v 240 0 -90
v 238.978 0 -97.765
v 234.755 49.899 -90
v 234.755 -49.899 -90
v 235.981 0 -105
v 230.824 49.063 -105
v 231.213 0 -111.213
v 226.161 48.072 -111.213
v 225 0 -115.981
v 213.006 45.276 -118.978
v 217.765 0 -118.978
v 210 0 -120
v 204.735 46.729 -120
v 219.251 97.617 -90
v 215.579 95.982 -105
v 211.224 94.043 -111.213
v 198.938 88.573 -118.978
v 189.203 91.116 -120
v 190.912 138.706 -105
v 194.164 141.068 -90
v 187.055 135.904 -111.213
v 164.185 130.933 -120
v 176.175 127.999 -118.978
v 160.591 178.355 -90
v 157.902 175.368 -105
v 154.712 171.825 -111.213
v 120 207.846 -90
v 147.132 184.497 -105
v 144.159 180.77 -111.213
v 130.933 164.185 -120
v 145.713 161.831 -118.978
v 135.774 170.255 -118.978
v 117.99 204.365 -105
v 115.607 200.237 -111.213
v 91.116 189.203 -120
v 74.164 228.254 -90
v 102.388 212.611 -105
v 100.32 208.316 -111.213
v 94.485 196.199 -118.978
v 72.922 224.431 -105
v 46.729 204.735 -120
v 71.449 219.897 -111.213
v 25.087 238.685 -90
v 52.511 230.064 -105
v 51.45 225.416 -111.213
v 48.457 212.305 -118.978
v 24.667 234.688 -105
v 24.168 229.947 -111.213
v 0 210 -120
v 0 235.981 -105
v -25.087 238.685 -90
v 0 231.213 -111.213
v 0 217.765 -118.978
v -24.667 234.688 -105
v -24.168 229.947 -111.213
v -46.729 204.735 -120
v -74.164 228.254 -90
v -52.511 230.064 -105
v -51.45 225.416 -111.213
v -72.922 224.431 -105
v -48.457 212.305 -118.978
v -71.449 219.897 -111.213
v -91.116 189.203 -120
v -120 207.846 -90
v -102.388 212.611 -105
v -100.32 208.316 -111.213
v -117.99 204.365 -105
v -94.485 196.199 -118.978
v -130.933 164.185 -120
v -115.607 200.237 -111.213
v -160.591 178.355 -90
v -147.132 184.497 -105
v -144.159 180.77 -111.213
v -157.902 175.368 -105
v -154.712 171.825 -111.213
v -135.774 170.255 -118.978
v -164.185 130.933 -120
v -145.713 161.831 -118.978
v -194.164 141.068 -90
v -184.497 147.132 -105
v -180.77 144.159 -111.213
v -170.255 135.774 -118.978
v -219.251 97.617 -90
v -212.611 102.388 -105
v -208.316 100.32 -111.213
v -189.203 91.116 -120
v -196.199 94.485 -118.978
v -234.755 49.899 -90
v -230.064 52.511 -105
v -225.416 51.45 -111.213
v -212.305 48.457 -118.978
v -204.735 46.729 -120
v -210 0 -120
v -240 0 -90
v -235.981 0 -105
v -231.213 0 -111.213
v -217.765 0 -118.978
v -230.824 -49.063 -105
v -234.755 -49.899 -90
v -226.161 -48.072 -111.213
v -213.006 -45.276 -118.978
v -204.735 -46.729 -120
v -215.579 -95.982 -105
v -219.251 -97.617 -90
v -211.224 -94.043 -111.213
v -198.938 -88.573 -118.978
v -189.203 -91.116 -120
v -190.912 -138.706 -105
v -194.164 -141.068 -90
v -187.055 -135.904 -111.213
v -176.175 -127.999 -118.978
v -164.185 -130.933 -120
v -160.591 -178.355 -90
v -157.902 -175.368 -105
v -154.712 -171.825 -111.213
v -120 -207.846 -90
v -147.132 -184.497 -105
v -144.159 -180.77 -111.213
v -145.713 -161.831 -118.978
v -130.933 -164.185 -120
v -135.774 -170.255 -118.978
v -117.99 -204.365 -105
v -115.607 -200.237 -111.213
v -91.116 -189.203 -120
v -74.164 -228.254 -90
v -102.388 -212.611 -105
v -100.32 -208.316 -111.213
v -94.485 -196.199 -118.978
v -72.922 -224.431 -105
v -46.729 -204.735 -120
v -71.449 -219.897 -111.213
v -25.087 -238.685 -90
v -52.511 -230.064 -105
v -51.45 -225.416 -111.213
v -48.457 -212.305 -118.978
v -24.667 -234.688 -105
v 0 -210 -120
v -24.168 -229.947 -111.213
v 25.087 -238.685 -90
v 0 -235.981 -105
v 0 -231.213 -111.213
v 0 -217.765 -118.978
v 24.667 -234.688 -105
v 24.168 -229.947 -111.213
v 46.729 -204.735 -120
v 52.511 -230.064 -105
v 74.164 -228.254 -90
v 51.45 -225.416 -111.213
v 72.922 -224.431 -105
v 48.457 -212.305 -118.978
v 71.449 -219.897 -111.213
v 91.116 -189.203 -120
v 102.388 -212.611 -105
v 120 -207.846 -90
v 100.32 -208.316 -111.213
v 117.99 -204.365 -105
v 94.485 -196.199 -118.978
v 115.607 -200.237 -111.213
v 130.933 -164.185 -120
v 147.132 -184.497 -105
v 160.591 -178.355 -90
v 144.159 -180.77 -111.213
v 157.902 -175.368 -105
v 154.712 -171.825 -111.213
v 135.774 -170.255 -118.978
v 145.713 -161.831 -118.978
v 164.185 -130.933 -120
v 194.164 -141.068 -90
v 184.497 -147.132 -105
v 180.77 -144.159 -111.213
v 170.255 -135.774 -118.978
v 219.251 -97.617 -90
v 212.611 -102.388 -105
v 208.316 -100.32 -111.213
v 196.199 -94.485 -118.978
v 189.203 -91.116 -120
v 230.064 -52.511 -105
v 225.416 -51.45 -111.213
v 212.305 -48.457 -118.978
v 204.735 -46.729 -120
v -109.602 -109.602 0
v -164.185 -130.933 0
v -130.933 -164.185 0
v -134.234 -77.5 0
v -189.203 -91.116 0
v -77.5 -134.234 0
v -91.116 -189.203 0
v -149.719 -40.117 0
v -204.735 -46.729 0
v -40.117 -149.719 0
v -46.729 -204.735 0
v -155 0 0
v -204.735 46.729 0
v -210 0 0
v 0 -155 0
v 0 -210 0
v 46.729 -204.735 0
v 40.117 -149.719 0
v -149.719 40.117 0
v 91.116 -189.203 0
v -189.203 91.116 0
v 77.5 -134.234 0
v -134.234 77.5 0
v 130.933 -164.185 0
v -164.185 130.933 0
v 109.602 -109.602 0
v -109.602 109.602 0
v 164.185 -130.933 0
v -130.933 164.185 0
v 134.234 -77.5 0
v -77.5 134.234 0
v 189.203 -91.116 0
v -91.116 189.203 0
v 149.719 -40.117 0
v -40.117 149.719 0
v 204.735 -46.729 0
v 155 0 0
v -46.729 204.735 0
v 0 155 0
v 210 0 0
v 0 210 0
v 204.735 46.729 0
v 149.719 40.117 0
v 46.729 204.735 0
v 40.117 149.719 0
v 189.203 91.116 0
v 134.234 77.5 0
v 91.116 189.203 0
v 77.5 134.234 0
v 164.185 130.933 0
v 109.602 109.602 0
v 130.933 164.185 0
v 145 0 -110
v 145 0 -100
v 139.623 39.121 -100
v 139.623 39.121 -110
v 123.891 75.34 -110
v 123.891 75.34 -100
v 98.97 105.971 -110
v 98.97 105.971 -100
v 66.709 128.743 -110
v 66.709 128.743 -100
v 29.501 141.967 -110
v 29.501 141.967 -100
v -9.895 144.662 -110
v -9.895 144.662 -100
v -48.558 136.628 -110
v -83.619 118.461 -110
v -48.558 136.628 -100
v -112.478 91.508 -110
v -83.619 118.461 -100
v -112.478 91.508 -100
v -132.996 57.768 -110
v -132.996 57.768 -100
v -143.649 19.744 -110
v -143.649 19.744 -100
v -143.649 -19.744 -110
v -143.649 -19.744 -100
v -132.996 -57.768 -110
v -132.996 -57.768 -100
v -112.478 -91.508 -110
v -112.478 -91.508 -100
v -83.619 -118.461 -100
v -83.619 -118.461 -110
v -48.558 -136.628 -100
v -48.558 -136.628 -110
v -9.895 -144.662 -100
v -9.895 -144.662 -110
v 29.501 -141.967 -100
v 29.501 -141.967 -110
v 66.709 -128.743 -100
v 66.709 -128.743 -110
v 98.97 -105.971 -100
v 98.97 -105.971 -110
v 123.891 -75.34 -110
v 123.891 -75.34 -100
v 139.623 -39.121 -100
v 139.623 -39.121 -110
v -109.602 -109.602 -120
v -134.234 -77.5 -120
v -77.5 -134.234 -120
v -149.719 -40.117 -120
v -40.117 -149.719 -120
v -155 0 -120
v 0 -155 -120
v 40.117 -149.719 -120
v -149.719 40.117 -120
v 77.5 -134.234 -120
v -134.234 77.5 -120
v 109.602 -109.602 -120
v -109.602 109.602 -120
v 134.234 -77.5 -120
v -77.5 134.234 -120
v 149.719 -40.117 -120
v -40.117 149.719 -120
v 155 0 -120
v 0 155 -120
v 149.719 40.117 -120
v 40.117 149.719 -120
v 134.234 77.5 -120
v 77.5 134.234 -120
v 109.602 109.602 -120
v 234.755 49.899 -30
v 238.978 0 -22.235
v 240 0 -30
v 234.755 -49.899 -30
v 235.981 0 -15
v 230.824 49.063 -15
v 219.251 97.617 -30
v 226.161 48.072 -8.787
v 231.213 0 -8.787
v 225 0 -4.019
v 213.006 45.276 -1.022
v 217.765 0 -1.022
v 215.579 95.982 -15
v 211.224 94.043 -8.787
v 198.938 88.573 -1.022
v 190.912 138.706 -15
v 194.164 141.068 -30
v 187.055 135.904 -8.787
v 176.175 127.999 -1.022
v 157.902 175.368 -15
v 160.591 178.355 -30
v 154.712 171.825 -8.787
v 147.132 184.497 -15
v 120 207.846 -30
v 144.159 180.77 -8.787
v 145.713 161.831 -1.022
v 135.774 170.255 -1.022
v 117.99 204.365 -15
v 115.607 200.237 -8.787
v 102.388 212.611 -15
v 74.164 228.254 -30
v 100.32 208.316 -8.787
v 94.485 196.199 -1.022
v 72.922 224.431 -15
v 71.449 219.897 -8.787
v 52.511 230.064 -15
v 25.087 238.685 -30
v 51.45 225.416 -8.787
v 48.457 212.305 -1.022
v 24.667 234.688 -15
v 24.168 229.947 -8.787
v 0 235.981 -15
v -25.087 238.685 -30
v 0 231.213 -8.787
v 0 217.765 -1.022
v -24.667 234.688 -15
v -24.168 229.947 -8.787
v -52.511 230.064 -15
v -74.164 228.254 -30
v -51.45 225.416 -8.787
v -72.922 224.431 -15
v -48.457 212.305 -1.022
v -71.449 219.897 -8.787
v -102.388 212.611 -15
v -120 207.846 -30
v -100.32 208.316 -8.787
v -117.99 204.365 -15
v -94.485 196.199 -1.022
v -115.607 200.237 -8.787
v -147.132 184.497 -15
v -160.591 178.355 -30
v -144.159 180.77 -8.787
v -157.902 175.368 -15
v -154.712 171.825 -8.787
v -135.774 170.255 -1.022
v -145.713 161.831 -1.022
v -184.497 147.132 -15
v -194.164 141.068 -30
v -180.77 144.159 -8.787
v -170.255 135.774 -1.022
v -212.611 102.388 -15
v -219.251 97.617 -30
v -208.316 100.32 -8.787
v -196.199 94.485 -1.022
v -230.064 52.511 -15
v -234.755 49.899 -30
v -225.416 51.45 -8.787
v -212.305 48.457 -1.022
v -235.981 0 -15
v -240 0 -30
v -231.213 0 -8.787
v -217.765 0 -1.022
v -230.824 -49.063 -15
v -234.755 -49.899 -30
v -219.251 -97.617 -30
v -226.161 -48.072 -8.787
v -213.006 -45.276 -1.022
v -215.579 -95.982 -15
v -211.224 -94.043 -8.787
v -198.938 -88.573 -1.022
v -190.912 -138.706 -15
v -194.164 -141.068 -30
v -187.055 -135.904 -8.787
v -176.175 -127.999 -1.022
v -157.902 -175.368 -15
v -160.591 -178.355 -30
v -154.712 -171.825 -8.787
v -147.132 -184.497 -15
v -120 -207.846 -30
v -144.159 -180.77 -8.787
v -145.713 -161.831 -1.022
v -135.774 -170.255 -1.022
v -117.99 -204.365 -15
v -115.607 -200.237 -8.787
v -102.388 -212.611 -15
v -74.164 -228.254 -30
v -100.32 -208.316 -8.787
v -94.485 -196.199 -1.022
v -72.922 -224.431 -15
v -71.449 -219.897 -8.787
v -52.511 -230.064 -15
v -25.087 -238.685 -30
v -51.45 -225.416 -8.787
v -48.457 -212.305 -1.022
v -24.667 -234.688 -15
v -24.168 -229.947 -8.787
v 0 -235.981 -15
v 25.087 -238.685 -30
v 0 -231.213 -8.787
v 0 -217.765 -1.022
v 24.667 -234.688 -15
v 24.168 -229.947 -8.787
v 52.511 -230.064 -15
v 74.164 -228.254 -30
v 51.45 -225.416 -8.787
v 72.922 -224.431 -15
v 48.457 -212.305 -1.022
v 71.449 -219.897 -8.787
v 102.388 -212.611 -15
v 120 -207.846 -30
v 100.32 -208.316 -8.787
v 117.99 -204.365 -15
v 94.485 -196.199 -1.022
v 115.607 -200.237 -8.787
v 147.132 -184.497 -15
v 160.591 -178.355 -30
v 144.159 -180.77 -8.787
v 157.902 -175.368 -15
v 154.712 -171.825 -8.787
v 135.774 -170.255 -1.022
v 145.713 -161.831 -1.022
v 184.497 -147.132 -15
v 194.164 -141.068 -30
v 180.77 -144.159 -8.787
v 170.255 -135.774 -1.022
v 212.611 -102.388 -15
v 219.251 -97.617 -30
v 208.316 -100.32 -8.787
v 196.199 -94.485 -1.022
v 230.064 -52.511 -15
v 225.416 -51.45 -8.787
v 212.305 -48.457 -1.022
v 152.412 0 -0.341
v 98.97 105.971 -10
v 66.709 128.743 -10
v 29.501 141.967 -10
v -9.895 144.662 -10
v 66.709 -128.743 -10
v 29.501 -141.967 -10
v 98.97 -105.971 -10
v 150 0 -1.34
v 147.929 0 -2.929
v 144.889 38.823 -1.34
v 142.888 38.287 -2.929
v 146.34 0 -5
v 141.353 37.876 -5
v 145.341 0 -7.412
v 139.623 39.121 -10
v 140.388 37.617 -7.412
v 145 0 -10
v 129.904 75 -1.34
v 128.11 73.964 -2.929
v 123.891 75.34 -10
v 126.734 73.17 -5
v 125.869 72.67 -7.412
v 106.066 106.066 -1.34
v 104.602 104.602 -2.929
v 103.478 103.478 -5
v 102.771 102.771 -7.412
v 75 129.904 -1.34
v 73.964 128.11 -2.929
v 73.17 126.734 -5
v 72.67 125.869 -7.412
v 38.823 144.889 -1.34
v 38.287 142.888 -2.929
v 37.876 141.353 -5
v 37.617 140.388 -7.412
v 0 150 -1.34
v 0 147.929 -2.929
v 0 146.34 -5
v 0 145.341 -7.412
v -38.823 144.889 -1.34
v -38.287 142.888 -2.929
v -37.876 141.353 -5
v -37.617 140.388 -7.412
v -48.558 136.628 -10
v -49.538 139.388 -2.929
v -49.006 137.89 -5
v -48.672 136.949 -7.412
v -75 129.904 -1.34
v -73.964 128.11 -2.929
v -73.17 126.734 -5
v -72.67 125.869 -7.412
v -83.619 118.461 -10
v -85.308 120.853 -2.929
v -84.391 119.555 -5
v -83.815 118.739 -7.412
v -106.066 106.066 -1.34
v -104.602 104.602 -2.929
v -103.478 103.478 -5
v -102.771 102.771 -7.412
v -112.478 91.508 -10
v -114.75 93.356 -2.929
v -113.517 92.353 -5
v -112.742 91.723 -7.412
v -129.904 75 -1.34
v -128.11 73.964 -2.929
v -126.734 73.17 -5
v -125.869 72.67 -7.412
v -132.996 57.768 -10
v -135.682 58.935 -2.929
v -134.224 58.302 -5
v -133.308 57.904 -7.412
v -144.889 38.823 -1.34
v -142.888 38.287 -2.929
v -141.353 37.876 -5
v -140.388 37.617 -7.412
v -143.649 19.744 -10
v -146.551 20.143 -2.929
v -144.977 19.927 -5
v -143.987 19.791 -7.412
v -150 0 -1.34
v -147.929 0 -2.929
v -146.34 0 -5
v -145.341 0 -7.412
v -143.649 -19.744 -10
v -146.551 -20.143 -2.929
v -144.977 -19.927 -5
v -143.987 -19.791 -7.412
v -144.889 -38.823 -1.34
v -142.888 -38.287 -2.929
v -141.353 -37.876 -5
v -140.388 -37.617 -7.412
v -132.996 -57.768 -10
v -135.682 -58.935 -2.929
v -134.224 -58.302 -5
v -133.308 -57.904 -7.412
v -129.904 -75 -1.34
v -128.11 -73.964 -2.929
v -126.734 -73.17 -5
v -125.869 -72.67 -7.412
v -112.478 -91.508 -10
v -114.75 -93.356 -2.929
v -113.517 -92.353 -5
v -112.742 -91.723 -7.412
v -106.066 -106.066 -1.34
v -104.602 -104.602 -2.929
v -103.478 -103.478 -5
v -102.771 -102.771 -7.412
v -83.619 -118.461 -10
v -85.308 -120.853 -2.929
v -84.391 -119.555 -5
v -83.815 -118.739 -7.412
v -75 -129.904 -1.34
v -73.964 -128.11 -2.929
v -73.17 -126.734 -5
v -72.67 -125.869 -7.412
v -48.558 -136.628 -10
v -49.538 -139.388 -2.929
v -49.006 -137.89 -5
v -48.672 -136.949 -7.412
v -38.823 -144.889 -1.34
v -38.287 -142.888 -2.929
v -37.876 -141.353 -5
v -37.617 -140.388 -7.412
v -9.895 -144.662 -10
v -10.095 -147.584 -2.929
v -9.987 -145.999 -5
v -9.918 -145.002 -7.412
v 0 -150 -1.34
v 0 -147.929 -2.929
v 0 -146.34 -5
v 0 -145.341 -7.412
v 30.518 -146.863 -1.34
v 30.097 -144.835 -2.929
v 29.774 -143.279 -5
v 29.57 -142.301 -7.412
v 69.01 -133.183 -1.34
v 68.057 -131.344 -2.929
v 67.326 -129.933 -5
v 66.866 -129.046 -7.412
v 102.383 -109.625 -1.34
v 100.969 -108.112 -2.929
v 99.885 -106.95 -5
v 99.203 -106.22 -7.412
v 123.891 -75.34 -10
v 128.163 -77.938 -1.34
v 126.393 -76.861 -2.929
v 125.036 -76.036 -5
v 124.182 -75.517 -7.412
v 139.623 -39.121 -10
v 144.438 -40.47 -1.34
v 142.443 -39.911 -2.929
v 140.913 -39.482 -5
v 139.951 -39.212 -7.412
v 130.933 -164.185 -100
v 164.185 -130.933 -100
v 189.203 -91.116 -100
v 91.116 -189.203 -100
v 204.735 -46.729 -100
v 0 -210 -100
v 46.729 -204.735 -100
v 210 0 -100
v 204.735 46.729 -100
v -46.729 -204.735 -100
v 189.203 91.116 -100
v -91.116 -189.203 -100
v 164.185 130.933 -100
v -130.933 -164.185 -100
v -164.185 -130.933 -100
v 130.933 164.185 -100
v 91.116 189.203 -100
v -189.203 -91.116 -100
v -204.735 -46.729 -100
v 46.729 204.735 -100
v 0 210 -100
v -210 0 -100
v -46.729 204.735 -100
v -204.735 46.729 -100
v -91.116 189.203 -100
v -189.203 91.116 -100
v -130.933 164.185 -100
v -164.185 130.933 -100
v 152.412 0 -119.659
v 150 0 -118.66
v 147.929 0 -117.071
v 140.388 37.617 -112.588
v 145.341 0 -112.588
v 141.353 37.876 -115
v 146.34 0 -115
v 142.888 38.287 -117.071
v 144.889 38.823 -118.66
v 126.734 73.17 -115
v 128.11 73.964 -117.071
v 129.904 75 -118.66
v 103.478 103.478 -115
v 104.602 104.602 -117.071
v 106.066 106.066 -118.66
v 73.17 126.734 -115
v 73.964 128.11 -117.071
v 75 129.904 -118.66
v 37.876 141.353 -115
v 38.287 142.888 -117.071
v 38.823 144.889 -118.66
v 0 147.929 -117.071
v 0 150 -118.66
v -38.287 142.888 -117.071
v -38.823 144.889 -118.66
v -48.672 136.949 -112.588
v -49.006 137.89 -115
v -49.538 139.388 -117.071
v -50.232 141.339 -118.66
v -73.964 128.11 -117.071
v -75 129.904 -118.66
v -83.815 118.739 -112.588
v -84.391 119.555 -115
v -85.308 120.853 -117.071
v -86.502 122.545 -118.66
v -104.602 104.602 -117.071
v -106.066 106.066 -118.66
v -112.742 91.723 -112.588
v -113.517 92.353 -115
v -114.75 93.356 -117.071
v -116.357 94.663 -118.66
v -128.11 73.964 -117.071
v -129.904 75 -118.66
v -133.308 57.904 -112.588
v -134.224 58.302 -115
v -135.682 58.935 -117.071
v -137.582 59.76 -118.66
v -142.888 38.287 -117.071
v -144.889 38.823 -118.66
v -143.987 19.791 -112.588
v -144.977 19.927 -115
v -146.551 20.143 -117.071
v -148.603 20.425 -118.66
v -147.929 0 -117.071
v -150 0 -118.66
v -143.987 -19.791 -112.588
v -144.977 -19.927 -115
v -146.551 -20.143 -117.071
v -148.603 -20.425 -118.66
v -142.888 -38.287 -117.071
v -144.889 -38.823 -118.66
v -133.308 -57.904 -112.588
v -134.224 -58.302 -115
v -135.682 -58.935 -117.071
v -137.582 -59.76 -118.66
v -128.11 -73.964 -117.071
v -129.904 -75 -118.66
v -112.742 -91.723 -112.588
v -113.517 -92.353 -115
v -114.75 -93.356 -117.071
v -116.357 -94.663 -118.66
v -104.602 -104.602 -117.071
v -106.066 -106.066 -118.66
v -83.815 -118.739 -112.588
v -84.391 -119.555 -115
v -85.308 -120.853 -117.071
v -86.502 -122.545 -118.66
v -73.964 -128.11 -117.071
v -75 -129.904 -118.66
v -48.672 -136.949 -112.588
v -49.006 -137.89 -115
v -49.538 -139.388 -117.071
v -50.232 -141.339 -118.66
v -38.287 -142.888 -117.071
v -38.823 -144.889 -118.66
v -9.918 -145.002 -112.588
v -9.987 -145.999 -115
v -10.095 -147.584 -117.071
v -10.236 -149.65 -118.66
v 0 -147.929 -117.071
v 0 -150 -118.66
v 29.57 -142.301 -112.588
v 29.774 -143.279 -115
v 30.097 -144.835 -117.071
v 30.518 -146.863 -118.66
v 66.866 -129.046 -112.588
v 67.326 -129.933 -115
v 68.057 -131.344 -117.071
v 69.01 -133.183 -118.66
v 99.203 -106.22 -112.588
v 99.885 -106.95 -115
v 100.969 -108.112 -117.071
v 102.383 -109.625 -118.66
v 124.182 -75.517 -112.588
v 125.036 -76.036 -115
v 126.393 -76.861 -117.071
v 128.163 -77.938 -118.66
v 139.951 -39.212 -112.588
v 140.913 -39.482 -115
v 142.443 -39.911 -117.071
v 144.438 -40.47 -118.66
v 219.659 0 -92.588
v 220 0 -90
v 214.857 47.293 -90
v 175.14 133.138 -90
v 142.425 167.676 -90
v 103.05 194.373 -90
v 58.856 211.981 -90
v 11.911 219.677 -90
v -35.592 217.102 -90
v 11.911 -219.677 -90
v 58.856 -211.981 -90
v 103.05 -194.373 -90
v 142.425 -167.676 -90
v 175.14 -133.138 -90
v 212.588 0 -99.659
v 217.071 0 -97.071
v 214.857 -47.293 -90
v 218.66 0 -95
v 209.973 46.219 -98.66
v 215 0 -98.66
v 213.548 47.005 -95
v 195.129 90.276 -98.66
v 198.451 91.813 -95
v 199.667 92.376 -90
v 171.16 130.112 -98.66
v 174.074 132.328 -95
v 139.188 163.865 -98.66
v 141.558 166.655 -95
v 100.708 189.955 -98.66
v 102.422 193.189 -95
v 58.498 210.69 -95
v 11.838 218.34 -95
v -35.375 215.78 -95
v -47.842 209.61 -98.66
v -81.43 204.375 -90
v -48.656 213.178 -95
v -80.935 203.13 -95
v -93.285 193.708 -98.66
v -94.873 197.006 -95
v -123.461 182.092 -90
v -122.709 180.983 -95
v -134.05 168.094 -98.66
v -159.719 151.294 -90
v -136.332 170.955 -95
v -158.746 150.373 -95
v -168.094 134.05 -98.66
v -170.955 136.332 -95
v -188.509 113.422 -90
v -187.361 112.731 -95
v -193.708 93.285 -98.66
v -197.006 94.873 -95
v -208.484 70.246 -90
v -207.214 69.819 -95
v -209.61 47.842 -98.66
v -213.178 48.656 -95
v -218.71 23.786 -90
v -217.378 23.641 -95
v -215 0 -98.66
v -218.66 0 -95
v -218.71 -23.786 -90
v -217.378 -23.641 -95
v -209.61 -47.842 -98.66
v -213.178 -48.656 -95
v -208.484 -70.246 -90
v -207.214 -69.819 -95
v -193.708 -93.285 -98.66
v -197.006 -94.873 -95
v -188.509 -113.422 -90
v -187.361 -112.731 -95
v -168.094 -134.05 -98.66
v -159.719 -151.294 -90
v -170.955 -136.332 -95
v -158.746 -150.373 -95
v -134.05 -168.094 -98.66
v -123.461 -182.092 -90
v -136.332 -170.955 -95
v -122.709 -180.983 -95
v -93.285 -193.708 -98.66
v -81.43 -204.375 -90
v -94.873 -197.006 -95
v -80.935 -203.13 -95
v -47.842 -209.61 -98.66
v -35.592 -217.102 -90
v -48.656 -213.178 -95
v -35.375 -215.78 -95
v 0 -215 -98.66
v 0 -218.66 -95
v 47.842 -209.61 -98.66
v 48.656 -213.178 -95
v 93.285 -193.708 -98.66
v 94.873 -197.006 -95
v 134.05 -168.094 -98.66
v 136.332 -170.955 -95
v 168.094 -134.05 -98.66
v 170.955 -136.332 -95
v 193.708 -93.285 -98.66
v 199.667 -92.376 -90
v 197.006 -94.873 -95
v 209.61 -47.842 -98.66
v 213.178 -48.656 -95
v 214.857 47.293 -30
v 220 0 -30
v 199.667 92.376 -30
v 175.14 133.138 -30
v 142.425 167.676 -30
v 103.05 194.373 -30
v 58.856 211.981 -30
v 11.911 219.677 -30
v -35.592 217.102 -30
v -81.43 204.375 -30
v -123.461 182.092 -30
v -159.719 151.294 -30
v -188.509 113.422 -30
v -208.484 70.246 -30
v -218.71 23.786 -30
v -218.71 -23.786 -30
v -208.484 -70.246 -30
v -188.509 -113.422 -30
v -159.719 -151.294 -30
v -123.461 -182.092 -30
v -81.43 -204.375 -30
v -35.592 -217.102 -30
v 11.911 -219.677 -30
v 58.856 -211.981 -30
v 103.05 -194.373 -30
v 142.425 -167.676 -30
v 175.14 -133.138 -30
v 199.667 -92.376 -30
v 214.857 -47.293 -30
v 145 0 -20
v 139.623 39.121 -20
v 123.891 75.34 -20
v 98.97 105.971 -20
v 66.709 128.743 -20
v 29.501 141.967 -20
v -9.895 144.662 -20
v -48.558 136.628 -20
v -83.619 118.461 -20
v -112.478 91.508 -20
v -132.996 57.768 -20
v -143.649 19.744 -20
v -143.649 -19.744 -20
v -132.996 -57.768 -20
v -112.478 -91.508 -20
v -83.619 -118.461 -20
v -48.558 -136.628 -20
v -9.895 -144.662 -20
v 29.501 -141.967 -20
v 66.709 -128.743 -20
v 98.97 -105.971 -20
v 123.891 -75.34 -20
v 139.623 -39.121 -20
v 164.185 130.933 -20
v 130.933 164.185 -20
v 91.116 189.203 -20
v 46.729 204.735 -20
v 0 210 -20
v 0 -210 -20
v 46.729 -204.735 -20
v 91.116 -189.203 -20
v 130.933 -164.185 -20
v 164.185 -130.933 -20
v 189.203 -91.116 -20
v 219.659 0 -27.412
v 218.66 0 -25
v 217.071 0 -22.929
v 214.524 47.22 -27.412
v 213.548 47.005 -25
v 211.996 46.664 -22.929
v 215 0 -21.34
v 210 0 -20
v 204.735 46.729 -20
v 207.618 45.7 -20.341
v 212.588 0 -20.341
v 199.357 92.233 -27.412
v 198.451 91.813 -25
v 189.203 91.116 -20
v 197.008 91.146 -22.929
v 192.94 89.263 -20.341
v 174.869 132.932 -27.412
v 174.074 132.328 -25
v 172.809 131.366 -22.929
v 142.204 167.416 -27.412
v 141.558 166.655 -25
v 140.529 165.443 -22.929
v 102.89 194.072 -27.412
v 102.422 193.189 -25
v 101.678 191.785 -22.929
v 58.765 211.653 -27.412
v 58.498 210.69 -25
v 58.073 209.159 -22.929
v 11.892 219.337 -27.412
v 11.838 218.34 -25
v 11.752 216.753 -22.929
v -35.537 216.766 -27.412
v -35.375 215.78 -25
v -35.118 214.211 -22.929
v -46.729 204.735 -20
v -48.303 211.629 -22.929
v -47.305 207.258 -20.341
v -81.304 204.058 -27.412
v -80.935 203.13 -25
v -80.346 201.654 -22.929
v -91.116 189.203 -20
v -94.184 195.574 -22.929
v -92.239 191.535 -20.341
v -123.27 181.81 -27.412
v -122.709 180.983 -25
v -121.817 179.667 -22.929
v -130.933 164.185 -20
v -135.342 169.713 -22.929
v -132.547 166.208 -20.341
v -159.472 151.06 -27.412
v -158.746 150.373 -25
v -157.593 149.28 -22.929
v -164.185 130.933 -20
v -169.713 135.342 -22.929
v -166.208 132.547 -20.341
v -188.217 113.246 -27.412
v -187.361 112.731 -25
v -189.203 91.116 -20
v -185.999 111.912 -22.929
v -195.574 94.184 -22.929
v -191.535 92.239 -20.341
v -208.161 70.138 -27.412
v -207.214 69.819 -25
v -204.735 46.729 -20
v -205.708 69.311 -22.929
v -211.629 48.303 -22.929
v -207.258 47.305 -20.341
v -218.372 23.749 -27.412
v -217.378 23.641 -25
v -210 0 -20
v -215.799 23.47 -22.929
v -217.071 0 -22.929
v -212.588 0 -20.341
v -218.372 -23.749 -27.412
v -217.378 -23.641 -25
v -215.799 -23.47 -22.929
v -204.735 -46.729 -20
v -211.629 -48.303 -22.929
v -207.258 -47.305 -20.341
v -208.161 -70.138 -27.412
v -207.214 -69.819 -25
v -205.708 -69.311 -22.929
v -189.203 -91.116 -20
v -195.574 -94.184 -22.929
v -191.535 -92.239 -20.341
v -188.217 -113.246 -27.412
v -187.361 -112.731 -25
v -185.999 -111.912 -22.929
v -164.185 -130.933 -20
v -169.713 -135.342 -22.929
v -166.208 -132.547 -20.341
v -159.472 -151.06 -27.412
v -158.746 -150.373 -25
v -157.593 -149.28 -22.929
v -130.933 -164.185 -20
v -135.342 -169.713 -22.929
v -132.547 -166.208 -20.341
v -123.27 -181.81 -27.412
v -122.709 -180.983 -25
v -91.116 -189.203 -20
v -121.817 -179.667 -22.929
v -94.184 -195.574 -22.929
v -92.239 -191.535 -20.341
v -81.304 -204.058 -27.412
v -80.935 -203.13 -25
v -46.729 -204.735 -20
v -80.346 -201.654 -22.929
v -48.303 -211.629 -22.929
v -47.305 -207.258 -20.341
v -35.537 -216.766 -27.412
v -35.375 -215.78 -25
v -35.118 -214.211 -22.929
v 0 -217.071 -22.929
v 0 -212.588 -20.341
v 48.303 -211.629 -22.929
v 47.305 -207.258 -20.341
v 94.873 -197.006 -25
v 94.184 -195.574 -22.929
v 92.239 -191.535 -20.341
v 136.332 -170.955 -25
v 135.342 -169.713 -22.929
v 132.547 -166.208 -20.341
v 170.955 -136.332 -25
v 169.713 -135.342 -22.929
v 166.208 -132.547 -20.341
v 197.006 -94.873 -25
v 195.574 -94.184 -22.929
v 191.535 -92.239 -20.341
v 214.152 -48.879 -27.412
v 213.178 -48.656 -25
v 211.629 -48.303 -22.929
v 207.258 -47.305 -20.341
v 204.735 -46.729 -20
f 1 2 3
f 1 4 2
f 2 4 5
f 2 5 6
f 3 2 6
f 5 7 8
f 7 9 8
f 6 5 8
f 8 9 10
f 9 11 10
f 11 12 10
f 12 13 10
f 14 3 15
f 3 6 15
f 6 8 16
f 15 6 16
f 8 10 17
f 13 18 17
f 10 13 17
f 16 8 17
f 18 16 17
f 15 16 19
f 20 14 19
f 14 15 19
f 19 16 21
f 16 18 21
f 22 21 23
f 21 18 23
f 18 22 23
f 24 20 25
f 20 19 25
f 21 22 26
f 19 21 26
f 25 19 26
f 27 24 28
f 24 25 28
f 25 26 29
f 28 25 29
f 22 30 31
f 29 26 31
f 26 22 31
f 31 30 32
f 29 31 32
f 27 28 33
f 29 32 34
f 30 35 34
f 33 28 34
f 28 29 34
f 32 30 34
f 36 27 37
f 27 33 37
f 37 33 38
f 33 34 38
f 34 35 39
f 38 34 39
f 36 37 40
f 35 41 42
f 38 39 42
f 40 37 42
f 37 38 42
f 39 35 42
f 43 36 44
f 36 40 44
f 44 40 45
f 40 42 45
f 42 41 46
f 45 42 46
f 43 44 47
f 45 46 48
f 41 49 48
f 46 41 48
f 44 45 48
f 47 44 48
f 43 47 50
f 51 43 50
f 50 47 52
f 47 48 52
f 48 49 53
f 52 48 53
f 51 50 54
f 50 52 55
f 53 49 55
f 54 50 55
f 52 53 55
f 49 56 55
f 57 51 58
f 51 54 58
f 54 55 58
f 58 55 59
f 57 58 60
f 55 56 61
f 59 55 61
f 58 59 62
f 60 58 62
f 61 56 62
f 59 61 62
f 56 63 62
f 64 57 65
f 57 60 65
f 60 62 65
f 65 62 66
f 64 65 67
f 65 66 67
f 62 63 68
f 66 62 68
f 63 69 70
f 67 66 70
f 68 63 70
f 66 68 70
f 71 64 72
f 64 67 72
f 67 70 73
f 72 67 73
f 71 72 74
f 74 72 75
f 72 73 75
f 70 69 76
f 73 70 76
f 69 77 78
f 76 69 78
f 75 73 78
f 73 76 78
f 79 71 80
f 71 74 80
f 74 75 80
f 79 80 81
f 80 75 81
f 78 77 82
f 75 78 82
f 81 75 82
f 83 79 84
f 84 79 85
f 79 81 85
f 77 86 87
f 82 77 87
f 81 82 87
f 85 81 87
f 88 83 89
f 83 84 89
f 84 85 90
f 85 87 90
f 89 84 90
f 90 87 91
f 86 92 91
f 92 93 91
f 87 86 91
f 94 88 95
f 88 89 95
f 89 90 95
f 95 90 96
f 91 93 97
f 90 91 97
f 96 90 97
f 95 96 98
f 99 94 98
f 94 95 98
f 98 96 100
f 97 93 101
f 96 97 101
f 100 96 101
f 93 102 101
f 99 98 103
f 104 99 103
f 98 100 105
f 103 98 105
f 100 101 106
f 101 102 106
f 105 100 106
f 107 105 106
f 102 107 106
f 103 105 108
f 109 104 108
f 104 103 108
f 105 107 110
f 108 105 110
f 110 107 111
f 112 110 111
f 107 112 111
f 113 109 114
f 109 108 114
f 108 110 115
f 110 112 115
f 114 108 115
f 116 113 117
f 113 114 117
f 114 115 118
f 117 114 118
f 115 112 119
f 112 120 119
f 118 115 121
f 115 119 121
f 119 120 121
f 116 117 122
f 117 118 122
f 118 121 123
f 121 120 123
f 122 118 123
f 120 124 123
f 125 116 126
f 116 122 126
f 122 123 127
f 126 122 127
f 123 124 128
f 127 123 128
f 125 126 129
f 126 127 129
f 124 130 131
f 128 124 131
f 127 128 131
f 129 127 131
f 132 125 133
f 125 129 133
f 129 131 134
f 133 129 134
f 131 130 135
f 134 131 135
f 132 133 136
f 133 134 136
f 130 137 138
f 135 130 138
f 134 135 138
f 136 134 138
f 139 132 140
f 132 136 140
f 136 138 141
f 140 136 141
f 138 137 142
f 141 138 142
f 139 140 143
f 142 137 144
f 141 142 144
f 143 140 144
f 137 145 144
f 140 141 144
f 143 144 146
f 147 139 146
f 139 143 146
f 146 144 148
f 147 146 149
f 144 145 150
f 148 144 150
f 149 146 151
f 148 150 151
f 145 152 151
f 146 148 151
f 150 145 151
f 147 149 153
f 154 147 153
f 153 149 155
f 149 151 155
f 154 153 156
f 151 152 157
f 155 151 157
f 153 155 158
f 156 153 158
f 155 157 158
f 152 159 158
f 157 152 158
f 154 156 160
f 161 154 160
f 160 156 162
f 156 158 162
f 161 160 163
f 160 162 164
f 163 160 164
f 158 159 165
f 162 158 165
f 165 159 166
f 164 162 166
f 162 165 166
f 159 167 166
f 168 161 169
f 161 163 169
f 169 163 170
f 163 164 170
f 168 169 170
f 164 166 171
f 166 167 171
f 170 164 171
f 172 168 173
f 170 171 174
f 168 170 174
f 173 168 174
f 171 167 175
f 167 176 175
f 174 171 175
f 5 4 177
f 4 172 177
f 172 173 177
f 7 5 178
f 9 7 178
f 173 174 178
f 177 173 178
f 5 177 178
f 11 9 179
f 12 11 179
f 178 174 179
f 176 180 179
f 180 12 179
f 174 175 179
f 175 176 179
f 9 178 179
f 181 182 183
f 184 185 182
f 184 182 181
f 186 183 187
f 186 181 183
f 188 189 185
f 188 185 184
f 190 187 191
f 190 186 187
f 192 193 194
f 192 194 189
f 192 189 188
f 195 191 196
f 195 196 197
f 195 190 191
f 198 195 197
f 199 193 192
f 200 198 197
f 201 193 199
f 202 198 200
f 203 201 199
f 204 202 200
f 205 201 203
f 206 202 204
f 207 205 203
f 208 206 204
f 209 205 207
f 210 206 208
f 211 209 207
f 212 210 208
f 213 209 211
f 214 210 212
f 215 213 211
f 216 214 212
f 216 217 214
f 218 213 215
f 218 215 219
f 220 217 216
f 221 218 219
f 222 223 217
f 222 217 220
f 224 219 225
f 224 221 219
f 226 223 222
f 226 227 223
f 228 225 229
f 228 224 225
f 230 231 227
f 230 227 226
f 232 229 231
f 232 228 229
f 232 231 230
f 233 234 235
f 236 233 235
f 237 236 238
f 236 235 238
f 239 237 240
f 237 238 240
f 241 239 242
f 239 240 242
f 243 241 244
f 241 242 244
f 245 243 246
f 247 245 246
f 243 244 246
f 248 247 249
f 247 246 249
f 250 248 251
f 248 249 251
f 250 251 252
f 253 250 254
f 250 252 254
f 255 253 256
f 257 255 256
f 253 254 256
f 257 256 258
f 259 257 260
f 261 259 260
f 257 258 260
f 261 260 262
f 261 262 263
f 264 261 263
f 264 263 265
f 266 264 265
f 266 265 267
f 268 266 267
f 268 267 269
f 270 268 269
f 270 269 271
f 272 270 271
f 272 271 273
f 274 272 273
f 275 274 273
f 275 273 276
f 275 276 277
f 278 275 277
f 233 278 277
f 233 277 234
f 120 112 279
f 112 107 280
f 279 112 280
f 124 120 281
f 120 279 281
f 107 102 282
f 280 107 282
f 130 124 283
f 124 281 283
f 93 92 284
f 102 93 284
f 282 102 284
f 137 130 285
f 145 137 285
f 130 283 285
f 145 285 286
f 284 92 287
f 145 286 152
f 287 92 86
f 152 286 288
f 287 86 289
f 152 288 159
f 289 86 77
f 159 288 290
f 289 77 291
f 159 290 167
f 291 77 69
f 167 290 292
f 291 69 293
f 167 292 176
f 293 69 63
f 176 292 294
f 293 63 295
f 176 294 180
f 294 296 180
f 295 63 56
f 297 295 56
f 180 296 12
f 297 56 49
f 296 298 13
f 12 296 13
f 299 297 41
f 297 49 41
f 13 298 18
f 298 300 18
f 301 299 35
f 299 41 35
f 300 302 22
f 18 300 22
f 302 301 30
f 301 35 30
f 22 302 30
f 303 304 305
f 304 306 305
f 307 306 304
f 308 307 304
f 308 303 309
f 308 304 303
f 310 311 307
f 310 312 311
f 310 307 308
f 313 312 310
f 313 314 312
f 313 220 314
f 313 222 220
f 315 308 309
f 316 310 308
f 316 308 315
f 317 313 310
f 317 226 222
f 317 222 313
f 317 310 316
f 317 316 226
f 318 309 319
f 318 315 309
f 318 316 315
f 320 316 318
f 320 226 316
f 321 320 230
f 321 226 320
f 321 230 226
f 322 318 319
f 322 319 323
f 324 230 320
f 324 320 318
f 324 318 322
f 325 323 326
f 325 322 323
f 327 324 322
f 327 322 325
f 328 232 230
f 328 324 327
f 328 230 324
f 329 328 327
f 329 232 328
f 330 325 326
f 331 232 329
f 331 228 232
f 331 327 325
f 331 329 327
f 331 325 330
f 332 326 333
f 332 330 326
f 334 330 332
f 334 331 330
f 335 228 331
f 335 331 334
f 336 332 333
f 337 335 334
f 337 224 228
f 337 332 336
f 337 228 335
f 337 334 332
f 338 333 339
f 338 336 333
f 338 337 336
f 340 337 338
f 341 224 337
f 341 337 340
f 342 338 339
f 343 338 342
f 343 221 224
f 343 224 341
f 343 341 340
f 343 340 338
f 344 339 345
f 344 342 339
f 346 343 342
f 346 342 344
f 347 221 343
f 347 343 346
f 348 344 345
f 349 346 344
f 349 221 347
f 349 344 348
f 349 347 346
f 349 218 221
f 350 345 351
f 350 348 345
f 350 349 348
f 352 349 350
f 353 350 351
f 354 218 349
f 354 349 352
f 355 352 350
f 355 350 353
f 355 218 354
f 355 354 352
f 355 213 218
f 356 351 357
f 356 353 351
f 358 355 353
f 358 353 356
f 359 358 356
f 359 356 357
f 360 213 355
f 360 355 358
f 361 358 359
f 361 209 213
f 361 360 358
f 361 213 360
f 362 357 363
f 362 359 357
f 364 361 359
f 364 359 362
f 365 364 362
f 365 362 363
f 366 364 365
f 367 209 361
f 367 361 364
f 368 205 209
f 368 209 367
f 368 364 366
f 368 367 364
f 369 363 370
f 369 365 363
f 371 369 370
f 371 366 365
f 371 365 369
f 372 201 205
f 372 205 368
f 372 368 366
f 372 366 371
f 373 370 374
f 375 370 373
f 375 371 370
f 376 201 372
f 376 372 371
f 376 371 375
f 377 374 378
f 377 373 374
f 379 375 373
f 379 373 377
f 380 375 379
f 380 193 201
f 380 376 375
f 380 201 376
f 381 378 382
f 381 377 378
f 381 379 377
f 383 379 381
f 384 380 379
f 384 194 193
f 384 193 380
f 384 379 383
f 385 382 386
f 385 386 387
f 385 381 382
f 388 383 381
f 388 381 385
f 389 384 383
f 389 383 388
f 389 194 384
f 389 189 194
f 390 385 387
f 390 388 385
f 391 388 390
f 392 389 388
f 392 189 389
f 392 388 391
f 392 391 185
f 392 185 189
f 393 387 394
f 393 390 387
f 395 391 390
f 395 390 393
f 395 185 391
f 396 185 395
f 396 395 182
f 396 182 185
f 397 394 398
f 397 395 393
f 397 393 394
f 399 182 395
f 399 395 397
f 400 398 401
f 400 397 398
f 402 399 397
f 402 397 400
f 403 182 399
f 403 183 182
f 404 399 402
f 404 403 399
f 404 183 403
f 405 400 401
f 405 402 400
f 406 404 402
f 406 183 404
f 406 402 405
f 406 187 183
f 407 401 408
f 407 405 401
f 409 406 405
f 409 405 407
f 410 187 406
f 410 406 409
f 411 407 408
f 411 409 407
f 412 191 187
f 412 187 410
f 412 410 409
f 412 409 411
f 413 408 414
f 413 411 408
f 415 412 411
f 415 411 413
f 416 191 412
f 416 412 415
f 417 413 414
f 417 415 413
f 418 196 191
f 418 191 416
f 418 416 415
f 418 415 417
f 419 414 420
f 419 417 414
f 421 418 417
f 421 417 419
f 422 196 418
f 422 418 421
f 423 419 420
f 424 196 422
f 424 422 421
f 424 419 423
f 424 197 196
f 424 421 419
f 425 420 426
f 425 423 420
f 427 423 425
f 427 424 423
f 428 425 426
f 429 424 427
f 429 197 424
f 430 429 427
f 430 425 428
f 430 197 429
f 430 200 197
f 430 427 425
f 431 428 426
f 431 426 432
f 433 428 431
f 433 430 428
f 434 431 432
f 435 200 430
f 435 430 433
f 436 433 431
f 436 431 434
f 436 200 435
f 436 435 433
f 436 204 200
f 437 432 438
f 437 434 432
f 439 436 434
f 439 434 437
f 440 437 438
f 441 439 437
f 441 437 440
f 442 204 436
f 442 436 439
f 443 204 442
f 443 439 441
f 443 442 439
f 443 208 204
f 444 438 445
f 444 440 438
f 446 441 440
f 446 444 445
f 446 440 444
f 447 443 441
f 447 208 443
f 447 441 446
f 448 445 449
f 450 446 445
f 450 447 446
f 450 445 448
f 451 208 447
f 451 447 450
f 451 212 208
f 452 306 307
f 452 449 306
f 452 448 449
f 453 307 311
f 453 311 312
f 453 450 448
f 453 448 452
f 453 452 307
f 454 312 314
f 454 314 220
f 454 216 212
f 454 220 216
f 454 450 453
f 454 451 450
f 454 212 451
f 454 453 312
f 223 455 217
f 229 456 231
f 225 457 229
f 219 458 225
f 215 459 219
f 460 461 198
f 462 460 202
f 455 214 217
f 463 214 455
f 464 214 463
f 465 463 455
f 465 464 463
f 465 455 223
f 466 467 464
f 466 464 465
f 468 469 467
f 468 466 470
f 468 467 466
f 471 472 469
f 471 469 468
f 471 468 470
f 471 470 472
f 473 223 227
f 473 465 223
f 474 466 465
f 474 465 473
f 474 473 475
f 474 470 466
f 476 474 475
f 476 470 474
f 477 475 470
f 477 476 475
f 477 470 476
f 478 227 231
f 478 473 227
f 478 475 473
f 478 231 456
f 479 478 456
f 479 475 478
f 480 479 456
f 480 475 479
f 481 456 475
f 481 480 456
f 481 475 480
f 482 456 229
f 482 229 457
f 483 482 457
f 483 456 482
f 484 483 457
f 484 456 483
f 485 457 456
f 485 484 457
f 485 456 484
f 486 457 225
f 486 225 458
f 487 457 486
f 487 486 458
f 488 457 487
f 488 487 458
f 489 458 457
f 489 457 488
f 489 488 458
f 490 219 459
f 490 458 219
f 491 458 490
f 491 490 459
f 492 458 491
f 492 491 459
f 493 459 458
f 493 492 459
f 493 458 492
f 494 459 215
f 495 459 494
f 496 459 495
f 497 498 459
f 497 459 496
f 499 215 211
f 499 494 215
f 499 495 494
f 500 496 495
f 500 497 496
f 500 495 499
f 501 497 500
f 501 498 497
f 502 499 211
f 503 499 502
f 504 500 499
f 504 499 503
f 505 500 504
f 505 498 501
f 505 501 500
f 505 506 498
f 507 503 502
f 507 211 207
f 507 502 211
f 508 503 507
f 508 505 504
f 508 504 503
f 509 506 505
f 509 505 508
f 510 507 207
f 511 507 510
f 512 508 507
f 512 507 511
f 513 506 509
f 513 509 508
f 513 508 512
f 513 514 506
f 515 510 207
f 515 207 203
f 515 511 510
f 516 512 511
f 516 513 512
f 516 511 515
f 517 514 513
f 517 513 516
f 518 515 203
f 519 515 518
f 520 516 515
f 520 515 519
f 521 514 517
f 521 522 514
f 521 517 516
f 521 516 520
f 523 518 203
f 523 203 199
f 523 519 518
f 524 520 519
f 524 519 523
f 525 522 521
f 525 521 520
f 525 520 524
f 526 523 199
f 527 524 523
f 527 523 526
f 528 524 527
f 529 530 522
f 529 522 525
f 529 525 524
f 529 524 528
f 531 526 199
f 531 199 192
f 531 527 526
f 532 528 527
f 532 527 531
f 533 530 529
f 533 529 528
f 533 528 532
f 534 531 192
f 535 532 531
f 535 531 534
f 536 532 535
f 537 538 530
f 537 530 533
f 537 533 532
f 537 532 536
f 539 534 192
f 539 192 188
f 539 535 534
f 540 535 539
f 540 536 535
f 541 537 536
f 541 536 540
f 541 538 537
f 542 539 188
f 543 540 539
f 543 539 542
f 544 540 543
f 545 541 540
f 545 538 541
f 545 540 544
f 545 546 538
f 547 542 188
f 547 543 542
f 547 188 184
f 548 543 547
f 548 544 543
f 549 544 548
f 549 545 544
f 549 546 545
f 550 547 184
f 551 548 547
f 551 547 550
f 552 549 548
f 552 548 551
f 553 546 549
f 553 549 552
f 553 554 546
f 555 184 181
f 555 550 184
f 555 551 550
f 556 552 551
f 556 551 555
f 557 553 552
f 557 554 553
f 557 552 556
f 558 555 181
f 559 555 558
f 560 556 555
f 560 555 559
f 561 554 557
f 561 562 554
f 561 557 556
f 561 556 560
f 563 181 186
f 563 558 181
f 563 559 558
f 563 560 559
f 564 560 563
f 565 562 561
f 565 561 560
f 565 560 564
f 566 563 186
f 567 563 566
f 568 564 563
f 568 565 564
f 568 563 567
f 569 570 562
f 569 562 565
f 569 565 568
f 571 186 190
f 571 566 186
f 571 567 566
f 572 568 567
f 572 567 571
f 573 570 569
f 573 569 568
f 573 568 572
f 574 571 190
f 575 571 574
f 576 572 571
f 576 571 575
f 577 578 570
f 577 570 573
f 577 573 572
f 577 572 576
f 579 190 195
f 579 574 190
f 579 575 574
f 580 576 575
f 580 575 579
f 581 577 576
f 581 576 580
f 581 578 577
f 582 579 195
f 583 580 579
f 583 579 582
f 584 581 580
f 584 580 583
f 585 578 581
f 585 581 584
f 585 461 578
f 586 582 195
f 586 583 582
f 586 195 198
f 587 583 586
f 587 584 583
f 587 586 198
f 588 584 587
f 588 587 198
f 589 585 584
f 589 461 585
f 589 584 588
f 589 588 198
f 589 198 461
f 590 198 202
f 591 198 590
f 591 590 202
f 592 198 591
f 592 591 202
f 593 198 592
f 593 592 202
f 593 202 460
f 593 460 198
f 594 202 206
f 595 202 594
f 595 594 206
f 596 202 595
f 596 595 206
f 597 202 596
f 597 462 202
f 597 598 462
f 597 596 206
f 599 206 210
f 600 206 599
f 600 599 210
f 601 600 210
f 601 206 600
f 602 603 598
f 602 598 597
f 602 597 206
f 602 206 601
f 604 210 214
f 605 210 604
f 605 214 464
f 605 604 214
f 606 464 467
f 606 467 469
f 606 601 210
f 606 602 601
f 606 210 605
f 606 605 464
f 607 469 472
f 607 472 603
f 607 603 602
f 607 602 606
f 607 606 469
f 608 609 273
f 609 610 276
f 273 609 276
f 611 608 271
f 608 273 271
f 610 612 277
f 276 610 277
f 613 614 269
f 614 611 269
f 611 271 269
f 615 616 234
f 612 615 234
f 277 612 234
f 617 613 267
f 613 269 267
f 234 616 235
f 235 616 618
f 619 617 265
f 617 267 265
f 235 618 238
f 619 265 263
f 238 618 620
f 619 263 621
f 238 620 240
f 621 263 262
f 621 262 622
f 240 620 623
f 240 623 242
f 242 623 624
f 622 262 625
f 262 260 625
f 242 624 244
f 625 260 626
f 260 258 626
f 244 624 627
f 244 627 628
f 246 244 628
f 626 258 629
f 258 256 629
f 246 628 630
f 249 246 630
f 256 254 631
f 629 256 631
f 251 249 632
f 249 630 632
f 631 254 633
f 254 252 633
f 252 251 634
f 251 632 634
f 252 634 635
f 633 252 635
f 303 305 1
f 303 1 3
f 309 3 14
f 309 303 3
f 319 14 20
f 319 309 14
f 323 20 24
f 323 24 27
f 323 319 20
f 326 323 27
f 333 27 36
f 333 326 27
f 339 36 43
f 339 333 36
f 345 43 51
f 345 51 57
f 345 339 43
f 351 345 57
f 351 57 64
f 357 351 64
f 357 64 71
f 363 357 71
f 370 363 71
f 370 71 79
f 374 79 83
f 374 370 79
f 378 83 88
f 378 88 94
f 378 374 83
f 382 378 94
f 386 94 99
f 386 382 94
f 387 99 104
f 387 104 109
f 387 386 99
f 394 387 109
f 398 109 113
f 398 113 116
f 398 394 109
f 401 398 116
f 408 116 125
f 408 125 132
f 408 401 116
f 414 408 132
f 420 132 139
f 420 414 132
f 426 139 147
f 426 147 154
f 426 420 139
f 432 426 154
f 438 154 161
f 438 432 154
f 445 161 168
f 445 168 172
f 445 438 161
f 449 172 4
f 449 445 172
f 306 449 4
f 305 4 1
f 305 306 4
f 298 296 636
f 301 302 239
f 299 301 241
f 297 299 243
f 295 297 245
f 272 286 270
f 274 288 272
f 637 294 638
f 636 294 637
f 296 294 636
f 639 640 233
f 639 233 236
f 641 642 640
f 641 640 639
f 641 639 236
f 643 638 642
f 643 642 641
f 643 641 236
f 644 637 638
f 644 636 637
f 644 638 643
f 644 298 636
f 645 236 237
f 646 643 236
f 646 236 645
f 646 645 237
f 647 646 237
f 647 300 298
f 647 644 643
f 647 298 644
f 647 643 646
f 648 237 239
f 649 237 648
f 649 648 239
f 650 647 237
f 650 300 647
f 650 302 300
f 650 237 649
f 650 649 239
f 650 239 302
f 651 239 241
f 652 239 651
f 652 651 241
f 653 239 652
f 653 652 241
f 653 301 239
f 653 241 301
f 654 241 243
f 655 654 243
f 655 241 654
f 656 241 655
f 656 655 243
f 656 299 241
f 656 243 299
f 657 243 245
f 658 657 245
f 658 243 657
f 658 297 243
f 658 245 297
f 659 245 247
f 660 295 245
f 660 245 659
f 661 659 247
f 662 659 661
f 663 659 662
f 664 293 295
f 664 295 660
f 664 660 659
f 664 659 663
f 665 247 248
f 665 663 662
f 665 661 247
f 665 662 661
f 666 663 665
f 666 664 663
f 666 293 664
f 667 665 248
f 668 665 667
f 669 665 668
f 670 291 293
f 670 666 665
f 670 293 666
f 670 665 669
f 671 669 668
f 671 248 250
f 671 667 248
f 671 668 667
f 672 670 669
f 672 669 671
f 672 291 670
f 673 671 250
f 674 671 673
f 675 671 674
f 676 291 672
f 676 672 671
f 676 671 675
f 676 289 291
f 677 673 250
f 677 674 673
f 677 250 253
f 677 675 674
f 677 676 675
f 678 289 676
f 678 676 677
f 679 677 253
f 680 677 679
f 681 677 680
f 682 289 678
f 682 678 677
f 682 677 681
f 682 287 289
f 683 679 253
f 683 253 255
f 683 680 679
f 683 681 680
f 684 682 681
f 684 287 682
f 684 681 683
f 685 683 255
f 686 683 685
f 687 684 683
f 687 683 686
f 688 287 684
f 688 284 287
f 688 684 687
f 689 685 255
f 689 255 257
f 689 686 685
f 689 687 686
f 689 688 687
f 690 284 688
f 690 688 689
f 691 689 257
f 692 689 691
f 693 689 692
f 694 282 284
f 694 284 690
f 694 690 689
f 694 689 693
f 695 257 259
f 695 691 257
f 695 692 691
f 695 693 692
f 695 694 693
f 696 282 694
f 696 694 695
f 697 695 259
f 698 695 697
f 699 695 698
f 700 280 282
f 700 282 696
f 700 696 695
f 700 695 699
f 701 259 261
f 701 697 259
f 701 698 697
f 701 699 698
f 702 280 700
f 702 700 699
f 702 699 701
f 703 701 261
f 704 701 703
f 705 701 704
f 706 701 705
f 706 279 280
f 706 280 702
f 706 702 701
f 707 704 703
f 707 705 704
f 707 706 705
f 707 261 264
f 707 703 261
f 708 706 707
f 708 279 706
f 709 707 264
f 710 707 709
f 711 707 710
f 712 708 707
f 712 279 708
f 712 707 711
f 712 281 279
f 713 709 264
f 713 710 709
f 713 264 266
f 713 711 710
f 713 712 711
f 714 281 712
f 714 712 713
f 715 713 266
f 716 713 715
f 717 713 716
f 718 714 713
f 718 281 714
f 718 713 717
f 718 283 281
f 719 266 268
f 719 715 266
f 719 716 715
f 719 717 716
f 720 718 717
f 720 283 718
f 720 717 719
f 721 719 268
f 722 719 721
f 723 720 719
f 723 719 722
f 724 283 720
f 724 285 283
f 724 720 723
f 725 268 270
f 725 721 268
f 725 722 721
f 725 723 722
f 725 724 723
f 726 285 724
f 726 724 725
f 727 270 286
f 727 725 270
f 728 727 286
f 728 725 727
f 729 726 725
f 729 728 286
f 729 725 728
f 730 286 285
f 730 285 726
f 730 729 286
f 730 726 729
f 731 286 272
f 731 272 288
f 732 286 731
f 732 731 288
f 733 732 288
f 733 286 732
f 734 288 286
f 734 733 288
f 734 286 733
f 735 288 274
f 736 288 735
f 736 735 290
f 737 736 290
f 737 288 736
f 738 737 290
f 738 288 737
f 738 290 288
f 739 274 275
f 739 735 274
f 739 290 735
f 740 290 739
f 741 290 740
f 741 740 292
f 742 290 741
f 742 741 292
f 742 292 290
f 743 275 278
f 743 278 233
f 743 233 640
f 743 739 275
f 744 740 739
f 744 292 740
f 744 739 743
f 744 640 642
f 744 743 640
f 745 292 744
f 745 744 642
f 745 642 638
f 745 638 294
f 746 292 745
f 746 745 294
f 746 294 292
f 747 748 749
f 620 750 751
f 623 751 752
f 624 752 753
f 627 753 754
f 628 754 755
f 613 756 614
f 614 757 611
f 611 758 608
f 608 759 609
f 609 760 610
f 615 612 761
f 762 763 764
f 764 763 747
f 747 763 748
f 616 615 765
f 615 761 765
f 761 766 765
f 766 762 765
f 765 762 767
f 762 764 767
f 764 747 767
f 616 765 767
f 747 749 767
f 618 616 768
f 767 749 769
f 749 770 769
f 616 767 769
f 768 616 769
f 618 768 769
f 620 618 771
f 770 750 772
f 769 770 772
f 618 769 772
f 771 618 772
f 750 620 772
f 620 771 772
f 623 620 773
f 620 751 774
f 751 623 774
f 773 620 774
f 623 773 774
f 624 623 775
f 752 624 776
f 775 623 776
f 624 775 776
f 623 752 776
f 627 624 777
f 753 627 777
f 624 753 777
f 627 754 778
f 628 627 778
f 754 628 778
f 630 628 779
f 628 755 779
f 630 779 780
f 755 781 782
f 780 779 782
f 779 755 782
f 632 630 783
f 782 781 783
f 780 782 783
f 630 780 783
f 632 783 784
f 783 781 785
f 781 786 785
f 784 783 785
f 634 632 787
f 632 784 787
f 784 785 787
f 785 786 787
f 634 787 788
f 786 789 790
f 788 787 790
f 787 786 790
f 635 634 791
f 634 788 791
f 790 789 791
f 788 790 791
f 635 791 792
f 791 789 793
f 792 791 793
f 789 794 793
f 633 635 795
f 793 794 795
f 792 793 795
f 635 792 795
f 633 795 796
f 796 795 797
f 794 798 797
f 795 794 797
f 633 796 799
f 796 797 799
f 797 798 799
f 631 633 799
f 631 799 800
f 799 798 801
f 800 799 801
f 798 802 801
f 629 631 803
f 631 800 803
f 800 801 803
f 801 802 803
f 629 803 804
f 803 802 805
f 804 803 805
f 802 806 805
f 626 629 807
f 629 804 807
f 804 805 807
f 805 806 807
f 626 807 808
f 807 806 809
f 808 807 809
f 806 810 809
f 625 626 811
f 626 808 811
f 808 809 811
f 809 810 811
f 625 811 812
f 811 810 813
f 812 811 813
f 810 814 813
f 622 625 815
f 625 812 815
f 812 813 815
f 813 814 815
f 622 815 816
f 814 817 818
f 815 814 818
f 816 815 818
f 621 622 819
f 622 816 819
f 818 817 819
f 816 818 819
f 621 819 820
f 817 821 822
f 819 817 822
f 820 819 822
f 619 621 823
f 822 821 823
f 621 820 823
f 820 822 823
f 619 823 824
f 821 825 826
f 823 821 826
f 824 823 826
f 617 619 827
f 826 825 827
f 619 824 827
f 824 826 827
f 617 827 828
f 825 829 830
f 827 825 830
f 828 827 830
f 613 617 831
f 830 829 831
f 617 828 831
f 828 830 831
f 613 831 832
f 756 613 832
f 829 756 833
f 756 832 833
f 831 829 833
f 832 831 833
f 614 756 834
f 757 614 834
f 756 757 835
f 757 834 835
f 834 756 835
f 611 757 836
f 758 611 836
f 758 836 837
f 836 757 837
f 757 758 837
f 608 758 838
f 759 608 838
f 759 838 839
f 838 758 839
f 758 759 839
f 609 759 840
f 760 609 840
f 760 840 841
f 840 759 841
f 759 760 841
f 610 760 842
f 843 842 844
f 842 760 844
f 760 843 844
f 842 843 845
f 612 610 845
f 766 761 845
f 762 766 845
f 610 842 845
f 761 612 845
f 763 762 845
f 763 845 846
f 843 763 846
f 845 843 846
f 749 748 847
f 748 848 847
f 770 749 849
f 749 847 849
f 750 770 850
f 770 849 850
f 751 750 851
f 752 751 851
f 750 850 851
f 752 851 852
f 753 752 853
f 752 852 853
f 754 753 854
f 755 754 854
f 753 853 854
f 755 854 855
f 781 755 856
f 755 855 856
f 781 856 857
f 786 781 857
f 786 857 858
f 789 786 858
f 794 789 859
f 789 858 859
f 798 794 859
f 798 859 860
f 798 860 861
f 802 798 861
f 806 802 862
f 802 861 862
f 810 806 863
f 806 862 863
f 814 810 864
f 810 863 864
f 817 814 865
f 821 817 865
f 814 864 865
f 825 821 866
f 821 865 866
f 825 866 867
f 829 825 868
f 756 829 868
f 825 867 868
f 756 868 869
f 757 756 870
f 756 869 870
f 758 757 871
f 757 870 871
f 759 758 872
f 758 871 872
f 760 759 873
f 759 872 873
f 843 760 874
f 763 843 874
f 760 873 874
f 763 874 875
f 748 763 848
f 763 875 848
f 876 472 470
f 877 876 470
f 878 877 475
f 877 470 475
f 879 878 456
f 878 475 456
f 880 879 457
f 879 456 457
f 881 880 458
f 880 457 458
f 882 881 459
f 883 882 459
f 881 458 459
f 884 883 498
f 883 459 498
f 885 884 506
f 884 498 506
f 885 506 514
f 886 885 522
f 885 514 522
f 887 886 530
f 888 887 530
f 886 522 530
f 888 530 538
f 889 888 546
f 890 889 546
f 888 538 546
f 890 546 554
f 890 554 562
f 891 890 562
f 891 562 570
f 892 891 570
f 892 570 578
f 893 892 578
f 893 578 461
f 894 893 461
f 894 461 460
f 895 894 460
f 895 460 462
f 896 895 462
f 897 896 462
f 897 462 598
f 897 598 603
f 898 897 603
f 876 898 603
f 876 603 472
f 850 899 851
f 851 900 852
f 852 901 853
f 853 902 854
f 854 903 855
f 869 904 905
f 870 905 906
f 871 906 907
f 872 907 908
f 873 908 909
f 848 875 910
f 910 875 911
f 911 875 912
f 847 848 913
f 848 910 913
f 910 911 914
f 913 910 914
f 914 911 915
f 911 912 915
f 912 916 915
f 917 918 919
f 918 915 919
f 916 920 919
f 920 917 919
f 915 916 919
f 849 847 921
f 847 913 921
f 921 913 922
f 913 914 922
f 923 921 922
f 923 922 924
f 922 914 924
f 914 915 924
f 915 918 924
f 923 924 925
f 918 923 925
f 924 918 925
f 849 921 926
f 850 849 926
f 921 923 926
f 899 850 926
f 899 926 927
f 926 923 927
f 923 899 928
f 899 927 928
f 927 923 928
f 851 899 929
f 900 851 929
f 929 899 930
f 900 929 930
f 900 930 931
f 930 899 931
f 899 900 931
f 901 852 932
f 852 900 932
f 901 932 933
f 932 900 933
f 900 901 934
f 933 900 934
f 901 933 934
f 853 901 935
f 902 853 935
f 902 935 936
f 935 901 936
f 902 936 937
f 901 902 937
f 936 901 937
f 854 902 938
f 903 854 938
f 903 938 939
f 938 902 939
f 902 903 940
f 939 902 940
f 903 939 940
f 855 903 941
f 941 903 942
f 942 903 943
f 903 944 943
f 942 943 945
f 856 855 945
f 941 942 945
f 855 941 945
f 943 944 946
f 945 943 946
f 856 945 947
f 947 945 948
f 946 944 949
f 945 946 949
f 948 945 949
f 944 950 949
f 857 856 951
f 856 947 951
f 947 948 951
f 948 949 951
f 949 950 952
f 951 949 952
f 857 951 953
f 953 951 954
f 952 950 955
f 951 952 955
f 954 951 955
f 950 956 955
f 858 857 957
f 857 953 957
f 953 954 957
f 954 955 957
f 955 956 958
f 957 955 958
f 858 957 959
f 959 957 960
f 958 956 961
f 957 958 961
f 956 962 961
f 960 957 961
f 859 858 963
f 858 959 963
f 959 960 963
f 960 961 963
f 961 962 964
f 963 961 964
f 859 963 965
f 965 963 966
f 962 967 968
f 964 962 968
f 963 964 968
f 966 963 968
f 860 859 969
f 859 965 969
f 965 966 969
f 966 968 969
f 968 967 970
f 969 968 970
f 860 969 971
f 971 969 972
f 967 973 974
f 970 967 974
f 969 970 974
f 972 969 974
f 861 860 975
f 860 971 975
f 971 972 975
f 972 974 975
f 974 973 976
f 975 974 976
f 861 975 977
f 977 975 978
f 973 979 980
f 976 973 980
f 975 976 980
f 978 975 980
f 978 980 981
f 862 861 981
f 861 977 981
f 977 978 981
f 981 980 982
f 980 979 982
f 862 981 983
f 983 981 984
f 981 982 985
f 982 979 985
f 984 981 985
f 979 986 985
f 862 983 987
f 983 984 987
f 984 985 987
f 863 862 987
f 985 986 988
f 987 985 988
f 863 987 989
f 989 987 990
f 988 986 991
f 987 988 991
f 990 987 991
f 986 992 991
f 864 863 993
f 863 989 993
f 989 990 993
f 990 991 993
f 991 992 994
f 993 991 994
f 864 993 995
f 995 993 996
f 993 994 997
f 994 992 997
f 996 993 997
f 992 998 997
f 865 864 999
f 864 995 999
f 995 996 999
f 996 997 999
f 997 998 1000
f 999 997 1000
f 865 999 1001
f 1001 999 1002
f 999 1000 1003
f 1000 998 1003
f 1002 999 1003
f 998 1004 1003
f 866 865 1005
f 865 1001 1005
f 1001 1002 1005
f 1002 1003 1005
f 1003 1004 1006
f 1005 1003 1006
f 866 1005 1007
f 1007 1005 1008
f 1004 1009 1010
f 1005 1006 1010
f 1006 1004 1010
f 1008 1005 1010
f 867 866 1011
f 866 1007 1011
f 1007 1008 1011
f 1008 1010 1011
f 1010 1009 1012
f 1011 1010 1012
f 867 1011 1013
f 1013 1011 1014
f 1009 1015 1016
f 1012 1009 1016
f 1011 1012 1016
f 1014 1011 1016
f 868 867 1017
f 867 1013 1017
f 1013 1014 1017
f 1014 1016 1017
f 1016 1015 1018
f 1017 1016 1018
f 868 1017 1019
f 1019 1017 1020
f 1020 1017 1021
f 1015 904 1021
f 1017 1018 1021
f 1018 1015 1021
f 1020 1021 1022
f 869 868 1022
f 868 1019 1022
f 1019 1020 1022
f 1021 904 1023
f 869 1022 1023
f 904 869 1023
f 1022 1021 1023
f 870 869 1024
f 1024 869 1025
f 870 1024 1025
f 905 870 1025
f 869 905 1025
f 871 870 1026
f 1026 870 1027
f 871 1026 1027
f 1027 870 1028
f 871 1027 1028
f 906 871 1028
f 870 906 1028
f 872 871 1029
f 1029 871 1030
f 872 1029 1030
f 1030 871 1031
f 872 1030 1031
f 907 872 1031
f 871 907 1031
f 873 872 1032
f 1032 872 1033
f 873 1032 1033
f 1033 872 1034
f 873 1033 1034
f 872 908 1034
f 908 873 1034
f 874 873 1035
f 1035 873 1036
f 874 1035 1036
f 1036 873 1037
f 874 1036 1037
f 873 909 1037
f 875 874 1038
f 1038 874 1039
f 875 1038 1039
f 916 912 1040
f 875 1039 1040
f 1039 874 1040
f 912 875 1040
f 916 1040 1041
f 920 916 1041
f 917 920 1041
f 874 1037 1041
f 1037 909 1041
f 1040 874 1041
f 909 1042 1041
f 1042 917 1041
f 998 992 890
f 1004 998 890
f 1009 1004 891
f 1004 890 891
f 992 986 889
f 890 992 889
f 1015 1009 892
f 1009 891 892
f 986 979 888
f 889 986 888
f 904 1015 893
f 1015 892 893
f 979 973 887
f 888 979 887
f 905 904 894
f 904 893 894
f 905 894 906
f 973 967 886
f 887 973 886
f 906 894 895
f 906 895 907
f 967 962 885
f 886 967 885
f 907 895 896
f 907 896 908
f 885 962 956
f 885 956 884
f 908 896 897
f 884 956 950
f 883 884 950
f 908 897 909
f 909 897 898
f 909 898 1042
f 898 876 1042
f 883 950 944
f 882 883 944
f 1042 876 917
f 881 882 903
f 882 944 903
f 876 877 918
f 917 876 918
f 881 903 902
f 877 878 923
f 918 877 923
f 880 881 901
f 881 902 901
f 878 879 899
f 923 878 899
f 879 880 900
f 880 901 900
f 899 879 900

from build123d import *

# Parameters (mm, degrees)
SKETCH1_R           = 240
SKETCH1_R_2         = 145
EXTRUDE_THIN1_DEPTH = 120
FILLET1_R           = 30
FILLET2_R           = 10
FILLET3_R           = 10


# Read off the part's stored shape, not the designer's step: Shell1
with BuildPart() as part:
    # Sketch1 → Extrude-Thin1 (new body)
    with BuildSketch(Plane.XY):
        Circle(SKETCH1_R)
        Circle(SKETCH1_R_2, mode=Mode.SUBTRACT)
    extrude(amount=-EXTRUDE_THIN1_DEPTH)

    # Fillet1
    fillet1_edges = [part.edges().sort_by_distance(p)[0] for p in [
        (-240, 0, 0),
        (-240, 0, -120),
    ]]
    fillet(fillet1_edges, radius=FILLET1_R)

    # Fillet2
    fillet2_edges = [part.edges().sort_by_distance(p)[0] for p in [
        (-145, 0, 0),
    ]]
    fillet(fillet2_edges, radius=FILLET2_R)

    # Fillet3
    fillet3_edges = [part.edges().sort_by_distance(p)[0] for p in [
        (-145, 0, -120),
    ]]
    fillet(fillet3_edges, radius=FILLET3_R)

    # Shell1 outline → Shell1 (revolve, cut)
    with BuildSketch(Plane.XZ):
        with BuildLine():
            ThreePointArc((210, -100), (217.071067812, -97.071067812), (220, -90))
            Line((220, -90), (220, -30))
            ThreePointArc((220, -30), (217.071067812, -22.928932188), (210, -20))
            Line((210, -20), (145, -20))
            Line((145, -20), (145, -100))
            Line((145, -100), (210, -100))
        make_face()
    revolve(axis=Axis((0, 0, 0), (0, 0, 1)), mode=Mode.SUBTRACT)


solid = part.part
